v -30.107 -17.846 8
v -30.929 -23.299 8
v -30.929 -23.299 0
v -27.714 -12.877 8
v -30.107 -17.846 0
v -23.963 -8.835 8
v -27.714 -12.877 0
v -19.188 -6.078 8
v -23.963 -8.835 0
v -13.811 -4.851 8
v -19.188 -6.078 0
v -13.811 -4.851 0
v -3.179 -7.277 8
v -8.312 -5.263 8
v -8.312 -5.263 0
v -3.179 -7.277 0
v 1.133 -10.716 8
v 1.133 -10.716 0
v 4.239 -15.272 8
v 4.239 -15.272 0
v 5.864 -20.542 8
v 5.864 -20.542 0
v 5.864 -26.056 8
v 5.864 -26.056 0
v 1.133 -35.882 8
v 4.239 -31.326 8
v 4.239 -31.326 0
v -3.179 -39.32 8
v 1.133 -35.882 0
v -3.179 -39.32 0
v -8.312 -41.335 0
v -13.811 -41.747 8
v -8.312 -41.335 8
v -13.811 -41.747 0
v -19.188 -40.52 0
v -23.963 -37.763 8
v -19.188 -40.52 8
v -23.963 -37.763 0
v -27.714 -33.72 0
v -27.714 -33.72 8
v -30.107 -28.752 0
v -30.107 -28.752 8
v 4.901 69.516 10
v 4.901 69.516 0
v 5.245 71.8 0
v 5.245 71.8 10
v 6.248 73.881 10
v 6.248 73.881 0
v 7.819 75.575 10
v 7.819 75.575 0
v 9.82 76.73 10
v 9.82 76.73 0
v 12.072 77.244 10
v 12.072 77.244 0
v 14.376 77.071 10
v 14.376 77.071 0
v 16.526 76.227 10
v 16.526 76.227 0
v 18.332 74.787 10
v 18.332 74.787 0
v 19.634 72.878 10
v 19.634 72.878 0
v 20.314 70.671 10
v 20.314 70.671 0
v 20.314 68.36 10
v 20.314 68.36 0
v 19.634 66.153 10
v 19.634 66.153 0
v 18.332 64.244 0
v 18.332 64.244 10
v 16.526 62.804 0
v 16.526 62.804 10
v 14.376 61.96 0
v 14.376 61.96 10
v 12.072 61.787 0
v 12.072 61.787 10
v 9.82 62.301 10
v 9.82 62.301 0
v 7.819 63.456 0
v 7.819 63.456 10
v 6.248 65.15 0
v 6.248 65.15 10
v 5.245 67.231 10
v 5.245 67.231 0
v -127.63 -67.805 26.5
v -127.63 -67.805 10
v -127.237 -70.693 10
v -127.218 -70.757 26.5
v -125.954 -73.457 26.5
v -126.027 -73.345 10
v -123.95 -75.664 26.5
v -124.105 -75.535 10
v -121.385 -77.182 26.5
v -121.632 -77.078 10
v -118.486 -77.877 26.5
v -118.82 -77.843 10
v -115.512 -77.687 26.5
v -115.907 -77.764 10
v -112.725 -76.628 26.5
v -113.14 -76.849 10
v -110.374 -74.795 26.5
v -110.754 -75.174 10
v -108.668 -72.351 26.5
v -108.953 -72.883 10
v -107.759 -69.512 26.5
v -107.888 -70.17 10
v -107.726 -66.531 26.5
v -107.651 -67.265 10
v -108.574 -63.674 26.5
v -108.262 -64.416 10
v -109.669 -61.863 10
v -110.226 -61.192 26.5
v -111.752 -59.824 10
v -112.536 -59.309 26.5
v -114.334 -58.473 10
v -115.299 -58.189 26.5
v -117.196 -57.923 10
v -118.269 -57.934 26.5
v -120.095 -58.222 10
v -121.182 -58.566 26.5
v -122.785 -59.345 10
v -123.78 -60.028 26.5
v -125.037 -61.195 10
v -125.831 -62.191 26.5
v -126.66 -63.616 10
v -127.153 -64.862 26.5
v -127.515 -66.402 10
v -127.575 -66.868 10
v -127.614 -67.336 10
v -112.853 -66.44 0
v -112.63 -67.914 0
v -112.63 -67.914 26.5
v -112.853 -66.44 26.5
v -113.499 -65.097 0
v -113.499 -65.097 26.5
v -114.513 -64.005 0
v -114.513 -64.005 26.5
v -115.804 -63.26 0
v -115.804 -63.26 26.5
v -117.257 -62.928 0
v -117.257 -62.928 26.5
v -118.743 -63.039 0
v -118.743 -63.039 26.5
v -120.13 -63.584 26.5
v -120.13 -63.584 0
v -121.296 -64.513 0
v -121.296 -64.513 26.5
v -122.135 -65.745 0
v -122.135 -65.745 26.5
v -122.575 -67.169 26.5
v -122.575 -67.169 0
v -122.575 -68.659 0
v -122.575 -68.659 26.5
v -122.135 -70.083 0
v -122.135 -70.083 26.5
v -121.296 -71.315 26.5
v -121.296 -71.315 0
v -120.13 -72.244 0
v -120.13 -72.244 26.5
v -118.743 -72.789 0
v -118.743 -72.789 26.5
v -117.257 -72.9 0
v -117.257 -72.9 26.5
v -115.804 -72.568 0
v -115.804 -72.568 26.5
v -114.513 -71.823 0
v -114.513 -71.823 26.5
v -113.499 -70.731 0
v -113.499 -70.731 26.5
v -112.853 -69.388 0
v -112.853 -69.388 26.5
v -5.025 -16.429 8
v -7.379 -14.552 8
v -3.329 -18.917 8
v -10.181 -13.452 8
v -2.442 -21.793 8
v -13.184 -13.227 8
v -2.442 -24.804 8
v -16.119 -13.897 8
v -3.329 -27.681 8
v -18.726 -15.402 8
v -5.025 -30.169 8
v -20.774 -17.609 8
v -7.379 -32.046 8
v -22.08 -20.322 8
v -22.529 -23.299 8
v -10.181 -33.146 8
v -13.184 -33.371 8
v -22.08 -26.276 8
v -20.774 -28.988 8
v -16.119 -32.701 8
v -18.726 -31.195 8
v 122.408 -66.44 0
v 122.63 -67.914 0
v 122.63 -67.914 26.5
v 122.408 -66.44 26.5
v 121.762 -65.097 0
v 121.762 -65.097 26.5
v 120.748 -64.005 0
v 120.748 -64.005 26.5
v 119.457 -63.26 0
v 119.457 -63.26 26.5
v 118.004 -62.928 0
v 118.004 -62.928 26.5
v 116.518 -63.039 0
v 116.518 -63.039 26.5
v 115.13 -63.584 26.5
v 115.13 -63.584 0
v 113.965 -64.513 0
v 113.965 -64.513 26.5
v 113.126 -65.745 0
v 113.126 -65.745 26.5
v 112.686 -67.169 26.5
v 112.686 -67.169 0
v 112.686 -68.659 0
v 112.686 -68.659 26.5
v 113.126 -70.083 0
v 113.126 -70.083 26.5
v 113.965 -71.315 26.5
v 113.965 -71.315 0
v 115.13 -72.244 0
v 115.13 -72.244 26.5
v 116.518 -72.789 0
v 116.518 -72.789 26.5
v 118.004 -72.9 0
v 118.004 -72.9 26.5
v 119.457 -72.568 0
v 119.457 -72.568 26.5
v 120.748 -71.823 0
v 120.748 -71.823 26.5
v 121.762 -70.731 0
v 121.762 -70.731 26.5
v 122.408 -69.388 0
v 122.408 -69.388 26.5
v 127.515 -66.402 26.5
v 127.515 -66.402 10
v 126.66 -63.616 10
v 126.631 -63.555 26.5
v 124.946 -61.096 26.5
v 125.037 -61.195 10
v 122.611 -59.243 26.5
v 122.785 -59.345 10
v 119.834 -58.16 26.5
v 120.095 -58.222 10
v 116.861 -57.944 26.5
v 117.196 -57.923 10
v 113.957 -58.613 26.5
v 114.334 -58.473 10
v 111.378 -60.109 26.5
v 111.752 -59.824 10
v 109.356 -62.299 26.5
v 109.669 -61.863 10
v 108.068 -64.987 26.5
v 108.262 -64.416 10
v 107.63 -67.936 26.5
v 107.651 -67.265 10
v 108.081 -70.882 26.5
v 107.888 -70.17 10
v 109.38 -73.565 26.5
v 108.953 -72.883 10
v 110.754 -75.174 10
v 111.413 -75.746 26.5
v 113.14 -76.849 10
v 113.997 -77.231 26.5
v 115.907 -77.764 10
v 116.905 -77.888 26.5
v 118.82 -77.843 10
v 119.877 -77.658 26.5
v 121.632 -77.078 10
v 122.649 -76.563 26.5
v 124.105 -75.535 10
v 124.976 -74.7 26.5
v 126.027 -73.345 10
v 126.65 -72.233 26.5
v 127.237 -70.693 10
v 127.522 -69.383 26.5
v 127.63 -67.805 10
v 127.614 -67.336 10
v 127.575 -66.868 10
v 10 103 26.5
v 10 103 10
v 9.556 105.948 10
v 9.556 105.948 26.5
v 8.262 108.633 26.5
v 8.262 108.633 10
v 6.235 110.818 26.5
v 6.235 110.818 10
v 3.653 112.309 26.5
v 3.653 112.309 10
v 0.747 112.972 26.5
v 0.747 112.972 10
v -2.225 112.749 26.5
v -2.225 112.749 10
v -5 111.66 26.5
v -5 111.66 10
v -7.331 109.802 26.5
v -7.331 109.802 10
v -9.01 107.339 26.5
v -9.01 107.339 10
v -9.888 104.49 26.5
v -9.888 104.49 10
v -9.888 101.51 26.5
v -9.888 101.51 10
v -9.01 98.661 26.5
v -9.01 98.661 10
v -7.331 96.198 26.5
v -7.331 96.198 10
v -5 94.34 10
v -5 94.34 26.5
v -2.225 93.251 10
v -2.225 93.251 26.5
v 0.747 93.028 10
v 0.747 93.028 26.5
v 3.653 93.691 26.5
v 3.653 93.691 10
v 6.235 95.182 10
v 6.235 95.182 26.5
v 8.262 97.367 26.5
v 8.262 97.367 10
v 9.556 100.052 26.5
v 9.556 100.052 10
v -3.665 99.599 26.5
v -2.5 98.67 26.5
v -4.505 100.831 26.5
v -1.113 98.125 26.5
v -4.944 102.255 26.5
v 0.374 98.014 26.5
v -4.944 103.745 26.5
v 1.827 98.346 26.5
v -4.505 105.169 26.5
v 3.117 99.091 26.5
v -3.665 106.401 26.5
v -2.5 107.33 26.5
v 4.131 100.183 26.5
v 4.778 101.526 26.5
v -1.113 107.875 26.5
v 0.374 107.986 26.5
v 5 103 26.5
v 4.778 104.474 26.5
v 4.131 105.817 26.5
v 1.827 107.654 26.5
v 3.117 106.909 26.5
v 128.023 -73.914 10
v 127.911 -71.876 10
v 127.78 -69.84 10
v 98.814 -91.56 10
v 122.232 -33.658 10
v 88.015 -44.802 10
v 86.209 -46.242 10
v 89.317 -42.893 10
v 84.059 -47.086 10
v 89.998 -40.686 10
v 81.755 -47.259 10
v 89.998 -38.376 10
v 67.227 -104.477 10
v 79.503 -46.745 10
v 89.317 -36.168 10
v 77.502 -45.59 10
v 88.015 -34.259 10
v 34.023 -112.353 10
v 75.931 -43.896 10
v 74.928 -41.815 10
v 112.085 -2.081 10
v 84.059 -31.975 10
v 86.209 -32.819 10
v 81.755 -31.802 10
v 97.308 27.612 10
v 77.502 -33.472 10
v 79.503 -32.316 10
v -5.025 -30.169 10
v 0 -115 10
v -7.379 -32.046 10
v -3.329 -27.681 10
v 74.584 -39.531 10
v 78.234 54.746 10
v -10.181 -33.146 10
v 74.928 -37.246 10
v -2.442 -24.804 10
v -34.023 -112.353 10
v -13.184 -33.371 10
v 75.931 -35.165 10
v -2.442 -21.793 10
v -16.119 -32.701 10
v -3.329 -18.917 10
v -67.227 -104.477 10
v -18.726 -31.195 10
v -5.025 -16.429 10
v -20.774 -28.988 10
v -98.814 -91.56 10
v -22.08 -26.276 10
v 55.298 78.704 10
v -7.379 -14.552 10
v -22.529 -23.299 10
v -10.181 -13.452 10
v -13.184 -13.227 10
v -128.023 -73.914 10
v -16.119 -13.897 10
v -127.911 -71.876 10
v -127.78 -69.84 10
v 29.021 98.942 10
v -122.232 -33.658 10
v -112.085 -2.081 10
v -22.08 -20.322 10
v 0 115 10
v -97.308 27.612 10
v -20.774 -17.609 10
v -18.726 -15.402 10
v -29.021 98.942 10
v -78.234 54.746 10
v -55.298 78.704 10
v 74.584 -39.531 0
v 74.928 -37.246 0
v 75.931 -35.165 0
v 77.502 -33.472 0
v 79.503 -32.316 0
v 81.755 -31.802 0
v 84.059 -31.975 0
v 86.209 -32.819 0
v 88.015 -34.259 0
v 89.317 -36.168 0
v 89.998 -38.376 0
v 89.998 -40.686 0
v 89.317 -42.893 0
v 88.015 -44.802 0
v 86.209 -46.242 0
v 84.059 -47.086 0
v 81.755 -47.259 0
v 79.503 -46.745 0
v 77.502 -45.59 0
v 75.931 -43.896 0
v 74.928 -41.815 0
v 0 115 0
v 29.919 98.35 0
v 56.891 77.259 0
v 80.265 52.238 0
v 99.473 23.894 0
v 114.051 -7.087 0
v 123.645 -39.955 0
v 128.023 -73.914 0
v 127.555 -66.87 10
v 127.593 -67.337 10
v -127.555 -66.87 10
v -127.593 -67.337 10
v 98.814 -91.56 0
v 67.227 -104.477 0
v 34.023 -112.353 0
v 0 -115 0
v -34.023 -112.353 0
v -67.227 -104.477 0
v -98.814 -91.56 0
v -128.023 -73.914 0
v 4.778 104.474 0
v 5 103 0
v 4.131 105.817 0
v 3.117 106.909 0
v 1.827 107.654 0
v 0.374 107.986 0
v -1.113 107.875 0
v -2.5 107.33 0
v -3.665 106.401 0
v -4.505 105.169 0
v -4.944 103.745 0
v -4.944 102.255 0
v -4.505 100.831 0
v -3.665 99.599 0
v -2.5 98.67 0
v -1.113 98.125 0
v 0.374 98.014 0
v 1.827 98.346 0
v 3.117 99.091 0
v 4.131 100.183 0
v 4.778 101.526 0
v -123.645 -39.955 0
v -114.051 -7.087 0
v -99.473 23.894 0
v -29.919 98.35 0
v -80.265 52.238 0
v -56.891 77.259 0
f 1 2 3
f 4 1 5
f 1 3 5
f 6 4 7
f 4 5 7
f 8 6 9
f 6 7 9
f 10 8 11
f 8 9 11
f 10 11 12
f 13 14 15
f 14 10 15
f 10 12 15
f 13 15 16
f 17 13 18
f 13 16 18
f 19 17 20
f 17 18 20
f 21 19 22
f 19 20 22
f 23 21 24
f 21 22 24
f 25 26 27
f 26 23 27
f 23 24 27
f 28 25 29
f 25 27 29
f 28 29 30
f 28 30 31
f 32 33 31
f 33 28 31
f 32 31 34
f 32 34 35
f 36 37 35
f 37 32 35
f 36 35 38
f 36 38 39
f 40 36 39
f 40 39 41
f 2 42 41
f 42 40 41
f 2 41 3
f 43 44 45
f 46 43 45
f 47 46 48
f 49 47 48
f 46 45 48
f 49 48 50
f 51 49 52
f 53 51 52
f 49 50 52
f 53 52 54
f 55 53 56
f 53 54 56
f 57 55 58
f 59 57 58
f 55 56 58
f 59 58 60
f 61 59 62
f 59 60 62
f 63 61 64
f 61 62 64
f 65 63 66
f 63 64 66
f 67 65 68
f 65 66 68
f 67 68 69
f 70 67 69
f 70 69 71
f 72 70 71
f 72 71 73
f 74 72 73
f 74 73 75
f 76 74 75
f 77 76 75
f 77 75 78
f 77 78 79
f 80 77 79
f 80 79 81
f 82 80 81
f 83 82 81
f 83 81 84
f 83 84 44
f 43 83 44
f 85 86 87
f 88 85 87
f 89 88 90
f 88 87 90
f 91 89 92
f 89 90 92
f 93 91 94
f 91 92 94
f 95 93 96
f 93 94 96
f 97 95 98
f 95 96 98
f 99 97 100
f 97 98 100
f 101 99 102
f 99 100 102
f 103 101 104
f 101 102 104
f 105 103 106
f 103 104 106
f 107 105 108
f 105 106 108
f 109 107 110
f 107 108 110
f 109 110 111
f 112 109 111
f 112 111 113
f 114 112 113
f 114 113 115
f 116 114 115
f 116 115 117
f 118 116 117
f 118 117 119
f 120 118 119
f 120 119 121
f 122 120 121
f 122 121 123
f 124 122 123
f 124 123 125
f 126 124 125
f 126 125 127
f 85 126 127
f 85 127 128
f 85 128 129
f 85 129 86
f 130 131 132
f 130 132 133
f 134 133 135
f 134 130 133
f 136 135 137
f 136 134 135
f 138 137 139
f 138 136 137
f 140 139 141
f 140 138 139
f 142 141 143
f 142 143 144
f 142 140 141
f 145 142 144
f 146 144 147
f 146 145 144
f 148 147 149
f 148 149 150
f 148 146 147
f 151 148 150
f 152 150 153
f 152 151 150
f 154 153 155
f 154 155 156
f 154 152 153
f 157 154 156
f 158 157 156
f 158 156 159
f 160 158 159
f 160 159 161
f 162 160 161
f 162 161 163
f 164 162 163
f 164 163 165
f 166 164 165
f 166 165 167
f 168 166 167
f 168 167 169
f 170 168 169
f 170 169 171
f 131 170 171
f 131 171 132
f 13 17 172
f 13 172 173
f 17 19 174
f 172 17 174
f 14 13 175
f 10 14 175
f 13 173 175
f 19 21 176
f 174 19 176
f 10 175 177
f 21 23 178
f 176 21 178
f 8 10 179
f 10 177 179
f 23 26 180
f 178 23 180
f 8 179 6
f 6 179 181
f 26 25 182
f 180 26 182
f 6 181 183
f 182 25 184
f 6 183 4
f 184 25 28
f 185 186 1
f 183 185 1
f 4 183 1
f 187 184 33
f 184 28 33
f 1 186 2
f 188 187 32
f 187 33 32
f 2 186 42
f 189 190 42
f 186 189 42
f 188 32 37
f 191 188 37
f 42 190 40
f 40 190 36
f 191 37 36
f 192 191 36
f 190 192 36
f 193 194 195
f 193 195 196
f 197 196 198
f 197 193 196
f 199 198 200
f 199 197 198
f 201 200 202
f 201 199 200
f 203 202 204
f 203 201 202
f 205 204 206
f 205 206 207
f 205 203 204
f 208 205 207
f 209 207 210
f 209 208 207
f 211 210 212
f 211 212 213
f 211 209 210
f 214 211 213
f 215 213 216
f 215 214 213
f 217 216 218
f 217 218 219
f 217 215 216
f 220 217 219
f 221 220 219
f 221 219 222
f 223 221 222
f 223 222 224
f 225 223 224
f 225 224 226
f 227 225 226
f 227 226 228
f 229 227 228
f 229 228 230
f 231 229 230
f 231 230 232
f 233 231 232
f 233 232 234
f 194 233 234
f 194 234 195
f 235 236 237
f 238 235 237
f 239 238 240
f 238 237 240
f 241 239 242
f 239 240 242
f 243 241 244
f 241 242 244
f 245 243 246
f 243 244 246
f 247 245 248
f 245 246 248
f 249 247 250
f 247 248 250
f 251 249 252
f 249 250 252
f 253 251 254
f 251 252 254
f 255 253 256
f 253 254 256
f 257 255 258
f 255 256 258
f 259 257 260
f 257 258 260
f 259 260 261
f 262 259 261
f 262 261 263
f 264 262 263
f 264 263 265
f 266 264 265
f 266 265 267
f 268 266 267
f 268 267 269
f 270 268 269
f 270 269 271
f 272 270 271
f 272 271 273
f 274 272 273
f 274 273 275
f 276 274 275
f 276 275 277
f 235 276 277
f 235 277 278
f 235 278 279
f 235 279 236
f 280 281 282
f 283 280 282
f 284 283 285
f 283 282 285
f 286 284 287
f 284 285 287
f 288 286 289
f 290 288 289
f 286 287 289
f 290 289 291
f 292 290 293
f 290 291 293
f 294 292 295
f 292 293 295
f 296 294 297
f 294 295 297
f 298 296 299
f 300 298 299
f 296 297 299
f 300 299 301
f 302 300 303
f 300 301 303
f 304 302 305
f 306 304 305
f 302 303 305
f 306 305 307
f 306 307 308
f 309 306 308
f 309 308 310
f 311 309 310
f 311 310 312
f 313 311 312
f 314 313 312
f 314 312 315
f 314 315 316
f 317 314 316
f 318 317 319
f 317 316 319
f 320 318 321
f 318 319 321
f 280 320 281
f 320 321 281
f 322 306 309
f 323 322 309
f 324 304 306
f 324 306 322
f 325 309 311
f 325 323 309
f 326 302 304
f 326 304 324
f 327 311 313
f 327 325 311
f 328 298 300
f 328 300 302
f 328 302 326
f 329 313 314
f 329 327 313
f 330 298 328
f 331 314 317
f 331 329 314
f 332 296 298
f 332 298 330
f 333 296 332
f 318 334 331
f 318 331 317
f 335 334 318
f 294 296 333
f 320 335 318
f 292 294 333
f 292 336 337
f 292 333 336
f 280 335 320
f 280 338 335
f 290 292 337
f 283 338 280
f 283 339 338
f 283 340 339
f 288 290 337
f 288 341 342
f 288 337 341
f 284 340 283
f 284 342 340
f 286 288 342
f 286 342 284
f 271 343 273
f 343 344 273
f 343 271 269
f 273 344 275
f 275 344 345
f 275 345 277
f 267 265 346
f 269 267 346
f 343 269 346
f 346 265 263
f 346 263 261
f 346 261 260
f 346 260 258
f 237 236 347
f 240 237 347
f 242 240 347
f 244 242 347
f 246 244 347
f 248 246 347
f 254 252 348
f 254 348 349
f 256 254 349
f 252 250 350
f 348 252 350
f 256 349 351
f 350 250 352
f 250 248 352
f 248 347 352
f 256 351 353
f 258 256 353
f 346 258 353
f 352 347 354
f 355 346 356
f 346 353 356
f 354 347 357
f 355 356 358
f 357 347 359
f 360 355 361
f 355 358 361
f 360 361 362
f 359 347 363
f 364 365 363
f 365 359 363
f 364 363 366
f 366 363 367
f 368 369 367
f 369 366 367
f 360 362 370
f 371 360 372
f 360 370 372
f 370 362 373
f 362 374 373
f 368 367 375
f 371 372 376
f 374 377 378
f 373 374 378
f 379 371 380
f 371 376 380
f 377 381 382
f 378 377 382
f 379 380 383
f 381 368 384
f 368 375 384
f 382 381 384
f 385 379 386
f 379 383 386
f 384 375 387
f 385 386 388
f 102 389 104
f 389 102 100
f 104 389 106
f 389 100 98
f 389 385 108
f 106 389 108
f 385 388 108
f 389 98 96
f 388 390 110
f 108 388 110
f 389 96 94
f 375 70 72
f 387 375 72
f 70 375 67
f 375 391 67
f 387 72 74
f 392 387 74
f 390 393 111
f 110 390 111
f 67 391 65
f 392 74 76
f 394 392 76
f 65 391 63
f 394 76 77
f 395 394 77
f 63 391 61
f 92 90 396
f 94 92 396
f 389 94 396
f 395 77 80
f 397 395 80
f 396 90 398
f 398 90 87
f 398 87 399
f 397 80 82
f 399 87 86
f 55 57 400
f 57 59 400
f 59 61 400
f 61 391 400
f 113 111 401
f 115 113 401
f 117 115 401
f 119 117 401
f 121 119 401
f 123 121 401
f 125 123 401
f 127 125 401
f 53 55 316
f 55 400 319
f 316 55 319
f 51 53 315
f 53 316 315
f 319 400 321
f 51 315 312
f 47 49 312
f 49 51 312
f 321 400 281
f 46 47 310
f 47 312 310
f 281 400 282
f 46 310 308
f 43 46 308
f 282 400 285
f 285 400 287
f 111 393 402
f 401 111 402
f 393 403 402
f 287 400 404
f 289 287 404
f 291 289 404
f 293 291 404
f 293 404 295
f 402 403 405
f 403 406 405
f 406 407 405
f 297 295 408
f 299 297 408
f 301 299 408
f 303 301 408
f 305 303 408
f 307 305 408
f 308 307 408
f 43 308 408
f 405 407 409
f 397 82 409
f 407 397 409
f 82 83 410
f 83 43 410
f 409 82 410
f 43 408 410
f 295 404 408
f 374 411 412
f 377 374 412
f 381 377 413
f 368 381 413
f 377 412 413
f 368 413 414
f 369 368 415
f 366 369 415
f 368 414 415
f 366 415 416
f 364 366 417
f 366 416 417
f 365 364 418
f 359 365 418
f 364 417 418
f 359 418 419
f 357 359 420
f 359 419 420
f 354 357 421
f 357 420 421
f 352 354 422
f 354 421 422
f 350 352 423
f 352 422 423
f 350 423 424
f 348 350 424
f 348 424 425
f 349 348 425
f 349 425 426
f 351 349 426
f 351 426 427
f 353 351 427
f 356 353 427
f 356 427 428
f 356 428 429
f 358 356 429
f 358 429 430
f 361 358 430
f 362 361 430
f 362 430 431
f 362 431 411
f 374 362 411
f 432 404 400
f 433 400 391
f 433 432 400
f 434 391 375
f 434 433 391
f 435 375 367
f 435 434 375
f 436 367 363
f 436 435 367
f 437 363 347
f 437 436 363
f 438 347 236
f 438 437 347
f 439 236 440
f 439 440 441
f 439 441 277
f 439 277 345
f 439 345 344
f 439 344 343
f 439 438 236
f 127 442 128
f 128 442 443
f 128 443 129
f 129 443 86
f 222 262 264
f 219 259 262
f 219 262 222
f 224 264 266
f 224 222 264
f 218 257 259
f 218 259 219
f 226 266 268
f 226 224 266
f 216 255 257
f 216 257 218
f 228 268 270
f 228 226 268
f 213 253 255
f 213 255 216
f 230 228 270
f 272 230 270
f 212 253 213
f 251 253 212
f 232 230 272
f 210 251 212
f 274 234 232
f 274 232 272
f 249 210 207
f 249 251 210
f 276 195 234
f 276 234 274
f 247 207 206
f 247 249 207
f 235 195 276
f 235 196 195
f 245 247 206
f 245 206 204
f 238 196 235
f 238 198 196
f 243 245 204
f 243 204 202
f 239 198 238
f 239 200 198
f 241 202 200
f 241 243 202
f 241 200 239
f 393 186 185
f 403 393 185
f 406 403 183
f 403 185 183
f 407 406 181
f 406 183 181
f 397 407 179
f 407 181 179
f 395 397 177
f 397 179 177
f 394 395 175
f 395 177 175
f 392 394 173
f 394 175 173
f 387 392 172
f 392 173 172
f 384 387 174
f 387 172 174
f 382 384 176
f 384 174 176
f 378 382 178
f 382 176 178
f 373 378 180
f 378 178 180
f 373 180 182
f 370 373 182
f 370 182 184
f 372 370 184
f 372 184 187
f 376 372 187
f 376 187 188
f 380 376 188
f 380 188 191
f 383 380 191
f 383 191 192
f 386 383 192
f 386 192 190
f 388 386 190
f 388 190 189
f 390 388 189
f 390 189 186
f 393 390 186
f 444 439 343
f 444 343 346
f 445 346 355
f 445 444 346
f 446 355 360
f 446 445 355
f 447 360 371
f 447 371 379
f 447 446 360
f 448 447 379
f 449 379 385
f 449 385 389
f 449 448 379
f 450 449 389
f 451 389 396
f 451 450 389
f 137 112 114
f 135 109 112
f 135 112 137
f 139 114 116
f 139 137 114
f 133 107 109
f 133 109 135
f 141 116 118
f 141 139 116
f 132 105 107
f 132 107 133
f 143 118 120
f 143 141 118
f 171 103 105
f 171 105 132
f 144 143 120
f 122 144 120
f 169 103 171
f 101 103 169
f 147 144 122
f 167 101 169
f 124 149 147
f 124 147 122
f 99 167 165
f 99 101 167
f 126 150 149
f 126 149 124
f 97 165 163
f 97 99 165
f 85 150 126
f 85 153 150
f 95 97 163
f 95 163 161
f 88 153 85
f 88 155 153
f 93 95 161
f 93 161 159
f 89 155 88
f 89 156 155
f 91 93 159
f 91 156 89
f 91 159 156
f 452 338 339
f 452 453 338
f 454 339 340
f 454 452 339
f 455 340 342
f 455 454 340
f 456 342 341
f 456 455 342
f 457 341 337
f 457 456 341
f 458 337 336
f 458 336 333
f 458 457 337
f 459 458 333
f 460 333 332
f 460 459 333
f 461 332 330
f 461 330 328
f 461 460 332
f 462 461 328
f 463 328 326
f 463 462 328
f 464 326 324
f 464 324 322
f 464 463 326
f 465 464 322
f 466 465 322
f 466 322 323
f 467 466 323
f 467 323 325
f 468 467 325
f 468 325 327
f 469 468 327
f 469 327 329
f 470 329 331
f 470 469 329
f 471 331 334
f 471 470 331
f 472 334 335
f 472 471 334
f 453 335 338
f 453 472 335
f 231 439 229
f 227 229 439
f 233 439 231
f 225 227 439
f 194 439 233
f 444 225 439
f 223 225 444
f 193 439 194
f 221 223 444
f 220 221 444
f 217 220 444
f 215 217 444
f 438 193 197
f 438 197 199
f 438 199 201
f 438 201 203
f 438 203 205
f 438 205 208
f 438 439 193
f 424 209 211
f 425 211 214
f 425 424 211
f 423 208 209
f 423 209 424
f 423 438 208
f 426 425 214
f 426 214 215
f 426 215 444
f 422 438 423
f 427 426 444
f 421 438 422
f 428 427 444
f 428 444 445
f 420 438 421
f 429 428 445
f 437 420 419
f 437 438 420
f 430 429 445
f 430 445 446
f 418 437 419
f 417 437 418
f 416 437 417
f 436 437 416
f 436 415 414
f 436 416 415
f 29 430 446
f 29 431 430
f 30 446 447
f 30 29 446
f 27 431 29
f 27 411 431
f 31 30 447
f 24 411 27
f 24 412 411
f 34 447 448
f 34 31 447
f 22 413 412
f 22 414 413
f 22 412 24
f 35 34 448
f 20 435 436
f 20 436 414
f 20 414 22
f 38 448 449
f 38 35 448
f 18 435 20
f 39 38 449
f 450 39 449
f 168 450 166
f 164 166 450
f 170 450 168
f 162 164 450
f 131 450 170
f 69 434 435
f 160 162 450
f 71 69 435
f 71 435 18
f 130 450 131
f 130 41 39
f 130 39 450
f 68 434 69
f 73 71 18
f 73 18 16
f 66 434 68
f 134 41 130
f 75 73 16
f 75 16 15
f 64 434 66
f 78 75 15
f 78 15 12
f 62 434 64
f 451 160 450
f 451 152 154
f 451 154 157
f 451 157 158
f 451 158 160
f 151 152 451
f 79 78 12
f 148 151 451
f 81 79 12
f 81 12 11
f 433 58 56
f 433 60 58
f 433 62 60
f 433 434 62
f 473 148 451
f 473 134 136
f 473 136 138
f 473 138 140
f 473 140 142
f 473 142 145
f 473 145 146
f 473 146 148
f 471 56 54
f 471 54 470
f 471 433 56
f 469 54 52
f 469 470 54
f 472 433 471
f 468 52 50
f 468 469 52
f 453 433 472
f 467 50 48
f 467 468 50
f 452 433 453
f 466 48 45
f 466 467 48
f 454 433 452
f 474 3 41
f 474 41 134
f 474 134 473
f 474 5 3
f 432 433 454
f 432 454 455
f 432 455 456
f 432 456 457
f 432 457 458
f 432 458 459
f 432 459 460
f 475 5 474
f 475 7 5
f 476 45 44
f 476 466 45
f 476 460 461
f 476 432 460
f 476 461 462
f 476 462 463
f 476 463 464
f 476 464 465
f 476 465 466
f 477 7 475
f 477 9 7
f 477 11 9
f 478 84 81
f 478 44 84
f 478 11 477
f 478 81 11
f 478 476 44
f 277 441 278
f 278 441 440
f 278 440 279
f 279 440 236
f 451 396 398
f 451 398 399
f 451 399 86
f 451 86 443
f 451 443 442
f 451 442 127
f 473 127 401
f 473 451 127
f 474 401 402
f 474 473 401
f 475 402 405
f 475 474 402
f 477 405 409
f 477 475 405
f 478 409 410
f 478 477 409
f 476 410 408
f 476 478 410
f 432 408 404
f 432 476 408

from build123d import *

# Parameters (mm, degrees)
SKETCH_1_R          = 5
EXTRUDE_1_DEPTH     = 10
SKETCH_2_R          = 10
SKETCH_2_R_2        = 5
EXTRUDE_2_DEPTH     = 16.5
SKETCH_3_R          = 7.75
SKETCH_3_R_2        = 15
CUT_EXTRUDE_1_DEPTH = 15
SKETCH_5_R          = 18.5
CUT_EXTRUDE_3_DEPTH = 10
EXTRUDE_START       = -2
SKETCH_6_R          = 18.5
EXTRUDE_3_DEPTH     = 2
SKETCH_7_R          = 10.1
CUT_EXTRUDE_4_DEPTH = 8


with BuildPart() as part:
    # 草图1 → 凸台-拉伸1 (new body)
    with BuildSketch(Plane.XY):
        with BuildLine():
            ThreePointArc((-128.022678922, -73.913928138), (-90.421378279, 38.440519474), (0, 115))
            ThreePointArc((0, 115), (90.421378279, 38.440519474), (128.022678922, -73.913928138))
            ThreePointArc((128.022678922, -73.913928138), (0, -115), (-128.022678922, -73.913928138))
        make_face()
        with Locations((0, 103)):
            Circle(SKETCH_1_R, mode=Mode.SUBTRACT)
        with Locations((-117.630374076, -67.913928138)):
            Circle(SKETCH_1_R, mode=Mode.SUBTRACT)
        with Locations((117.630374076, -67.913928138)):
            Circle(SKETCH_1_R, mode=Mode.SUBTRACT)
    extrude(amount=EXTRUDE_1_DEPTH)

    # 草图2 → 凸台-拉伸2 (add)
    # profile 1 of 3: a face of its own
    with BuildSketch(Plane.XY.offset(10)):
        with Locations((0, 103)):
            Circle(SKETCH_2_R)
        with Locations((0, 103)):
            Circle(SKETCH_2_R_2, mode=Mode.SUBTRACT)
    # profile 2 of 3: a face of its own
    with BuildSketch(Plane.XY.offset(10)):
        with Locations(Location((-117.630374076, -67.913928138, 0), (0, 0, 179.375778052))):
            Circle(SKETCH_2_R)
        with Locations((-117.630374076, -67.913928138)):
            Circle(SKETCH_2_R_2, mode=Mode.SUBTRACT)
    # profile 3 of 3: a face of its own
    with BuildSketch(Plane.XY.offset(10)):
        with Locations(Location((117.630374076, -67.913928138, 0), (0, 0, 8.696571879))):
            Circle(SKETCH_2_R)
        with Locations((117.630374076, -67.913928138)):
            Circle(SKETCH_2_R_2, mode=Mode.SUBTRACT)
    extrude(amount=EXTRUDE_2_DEPTH)

    # 草图3 → 切除-拉伸1 (cut)
    with BuildSketch(Plane(origin=(0, 0, 0), x_dir=(-1, 0, 0), z_dir=(0, 0, -1))):
        with Locations((-12.650995066, 69.515536741)):
            Circle(SKETCH_3_R)
        with Locations((-82.334125615, -39.530718783)):
            Circle(SKETCH_3_R)
        with Locations((12.428876199, -23.298802993)):
            Circle(SKETCH_3_R_2)
    extrude(amount=-CUT_EXTRUDE_1_DEPTH, mode=Mode.SUBTRACT)

    # 草图5 → 切除-拉伸3 (cut)
    with BuildSketch(Plane(origin=(0, 0, 0), x_dir=(-1, 0, 0), z_dir=(0, 0, -1))):
        with Locations((12.428876199, -23.298802993)):
            Circle(SKETCH_5_R)
    extrude(amount=-CUT_EXTRUDE_3_DEPTH, mode=Mode.SUBTRACT)

    # 草图6 → 凸台-拉伸3 (add)
    with BuildSketch(Plane.XY.offset(10).offset(EXTRUDE_START)):
        with Locations(Location((-12.428876199, -23.298802993, 0), (0, 0, 180))):
            Circle(SKETCH_6_R)
    extrude(amount=EXTRUDE_3_DEPTH)

    # 草图7 → 切除-拉伸4 (cut)
    with BuildSketch(Plane(origin=(0, 0, 8), x_dir=(-1, 0, 0), z_dir=(0, 0, -1))):
        with Locations((12.428876199, -23.298802993)):
            Circle(SKETCH_7_R)
    extrude(amount=-CUT_EXTRUDE_4_DEPTH, mode=Mode.SUBTRACT)


solid = part.part
